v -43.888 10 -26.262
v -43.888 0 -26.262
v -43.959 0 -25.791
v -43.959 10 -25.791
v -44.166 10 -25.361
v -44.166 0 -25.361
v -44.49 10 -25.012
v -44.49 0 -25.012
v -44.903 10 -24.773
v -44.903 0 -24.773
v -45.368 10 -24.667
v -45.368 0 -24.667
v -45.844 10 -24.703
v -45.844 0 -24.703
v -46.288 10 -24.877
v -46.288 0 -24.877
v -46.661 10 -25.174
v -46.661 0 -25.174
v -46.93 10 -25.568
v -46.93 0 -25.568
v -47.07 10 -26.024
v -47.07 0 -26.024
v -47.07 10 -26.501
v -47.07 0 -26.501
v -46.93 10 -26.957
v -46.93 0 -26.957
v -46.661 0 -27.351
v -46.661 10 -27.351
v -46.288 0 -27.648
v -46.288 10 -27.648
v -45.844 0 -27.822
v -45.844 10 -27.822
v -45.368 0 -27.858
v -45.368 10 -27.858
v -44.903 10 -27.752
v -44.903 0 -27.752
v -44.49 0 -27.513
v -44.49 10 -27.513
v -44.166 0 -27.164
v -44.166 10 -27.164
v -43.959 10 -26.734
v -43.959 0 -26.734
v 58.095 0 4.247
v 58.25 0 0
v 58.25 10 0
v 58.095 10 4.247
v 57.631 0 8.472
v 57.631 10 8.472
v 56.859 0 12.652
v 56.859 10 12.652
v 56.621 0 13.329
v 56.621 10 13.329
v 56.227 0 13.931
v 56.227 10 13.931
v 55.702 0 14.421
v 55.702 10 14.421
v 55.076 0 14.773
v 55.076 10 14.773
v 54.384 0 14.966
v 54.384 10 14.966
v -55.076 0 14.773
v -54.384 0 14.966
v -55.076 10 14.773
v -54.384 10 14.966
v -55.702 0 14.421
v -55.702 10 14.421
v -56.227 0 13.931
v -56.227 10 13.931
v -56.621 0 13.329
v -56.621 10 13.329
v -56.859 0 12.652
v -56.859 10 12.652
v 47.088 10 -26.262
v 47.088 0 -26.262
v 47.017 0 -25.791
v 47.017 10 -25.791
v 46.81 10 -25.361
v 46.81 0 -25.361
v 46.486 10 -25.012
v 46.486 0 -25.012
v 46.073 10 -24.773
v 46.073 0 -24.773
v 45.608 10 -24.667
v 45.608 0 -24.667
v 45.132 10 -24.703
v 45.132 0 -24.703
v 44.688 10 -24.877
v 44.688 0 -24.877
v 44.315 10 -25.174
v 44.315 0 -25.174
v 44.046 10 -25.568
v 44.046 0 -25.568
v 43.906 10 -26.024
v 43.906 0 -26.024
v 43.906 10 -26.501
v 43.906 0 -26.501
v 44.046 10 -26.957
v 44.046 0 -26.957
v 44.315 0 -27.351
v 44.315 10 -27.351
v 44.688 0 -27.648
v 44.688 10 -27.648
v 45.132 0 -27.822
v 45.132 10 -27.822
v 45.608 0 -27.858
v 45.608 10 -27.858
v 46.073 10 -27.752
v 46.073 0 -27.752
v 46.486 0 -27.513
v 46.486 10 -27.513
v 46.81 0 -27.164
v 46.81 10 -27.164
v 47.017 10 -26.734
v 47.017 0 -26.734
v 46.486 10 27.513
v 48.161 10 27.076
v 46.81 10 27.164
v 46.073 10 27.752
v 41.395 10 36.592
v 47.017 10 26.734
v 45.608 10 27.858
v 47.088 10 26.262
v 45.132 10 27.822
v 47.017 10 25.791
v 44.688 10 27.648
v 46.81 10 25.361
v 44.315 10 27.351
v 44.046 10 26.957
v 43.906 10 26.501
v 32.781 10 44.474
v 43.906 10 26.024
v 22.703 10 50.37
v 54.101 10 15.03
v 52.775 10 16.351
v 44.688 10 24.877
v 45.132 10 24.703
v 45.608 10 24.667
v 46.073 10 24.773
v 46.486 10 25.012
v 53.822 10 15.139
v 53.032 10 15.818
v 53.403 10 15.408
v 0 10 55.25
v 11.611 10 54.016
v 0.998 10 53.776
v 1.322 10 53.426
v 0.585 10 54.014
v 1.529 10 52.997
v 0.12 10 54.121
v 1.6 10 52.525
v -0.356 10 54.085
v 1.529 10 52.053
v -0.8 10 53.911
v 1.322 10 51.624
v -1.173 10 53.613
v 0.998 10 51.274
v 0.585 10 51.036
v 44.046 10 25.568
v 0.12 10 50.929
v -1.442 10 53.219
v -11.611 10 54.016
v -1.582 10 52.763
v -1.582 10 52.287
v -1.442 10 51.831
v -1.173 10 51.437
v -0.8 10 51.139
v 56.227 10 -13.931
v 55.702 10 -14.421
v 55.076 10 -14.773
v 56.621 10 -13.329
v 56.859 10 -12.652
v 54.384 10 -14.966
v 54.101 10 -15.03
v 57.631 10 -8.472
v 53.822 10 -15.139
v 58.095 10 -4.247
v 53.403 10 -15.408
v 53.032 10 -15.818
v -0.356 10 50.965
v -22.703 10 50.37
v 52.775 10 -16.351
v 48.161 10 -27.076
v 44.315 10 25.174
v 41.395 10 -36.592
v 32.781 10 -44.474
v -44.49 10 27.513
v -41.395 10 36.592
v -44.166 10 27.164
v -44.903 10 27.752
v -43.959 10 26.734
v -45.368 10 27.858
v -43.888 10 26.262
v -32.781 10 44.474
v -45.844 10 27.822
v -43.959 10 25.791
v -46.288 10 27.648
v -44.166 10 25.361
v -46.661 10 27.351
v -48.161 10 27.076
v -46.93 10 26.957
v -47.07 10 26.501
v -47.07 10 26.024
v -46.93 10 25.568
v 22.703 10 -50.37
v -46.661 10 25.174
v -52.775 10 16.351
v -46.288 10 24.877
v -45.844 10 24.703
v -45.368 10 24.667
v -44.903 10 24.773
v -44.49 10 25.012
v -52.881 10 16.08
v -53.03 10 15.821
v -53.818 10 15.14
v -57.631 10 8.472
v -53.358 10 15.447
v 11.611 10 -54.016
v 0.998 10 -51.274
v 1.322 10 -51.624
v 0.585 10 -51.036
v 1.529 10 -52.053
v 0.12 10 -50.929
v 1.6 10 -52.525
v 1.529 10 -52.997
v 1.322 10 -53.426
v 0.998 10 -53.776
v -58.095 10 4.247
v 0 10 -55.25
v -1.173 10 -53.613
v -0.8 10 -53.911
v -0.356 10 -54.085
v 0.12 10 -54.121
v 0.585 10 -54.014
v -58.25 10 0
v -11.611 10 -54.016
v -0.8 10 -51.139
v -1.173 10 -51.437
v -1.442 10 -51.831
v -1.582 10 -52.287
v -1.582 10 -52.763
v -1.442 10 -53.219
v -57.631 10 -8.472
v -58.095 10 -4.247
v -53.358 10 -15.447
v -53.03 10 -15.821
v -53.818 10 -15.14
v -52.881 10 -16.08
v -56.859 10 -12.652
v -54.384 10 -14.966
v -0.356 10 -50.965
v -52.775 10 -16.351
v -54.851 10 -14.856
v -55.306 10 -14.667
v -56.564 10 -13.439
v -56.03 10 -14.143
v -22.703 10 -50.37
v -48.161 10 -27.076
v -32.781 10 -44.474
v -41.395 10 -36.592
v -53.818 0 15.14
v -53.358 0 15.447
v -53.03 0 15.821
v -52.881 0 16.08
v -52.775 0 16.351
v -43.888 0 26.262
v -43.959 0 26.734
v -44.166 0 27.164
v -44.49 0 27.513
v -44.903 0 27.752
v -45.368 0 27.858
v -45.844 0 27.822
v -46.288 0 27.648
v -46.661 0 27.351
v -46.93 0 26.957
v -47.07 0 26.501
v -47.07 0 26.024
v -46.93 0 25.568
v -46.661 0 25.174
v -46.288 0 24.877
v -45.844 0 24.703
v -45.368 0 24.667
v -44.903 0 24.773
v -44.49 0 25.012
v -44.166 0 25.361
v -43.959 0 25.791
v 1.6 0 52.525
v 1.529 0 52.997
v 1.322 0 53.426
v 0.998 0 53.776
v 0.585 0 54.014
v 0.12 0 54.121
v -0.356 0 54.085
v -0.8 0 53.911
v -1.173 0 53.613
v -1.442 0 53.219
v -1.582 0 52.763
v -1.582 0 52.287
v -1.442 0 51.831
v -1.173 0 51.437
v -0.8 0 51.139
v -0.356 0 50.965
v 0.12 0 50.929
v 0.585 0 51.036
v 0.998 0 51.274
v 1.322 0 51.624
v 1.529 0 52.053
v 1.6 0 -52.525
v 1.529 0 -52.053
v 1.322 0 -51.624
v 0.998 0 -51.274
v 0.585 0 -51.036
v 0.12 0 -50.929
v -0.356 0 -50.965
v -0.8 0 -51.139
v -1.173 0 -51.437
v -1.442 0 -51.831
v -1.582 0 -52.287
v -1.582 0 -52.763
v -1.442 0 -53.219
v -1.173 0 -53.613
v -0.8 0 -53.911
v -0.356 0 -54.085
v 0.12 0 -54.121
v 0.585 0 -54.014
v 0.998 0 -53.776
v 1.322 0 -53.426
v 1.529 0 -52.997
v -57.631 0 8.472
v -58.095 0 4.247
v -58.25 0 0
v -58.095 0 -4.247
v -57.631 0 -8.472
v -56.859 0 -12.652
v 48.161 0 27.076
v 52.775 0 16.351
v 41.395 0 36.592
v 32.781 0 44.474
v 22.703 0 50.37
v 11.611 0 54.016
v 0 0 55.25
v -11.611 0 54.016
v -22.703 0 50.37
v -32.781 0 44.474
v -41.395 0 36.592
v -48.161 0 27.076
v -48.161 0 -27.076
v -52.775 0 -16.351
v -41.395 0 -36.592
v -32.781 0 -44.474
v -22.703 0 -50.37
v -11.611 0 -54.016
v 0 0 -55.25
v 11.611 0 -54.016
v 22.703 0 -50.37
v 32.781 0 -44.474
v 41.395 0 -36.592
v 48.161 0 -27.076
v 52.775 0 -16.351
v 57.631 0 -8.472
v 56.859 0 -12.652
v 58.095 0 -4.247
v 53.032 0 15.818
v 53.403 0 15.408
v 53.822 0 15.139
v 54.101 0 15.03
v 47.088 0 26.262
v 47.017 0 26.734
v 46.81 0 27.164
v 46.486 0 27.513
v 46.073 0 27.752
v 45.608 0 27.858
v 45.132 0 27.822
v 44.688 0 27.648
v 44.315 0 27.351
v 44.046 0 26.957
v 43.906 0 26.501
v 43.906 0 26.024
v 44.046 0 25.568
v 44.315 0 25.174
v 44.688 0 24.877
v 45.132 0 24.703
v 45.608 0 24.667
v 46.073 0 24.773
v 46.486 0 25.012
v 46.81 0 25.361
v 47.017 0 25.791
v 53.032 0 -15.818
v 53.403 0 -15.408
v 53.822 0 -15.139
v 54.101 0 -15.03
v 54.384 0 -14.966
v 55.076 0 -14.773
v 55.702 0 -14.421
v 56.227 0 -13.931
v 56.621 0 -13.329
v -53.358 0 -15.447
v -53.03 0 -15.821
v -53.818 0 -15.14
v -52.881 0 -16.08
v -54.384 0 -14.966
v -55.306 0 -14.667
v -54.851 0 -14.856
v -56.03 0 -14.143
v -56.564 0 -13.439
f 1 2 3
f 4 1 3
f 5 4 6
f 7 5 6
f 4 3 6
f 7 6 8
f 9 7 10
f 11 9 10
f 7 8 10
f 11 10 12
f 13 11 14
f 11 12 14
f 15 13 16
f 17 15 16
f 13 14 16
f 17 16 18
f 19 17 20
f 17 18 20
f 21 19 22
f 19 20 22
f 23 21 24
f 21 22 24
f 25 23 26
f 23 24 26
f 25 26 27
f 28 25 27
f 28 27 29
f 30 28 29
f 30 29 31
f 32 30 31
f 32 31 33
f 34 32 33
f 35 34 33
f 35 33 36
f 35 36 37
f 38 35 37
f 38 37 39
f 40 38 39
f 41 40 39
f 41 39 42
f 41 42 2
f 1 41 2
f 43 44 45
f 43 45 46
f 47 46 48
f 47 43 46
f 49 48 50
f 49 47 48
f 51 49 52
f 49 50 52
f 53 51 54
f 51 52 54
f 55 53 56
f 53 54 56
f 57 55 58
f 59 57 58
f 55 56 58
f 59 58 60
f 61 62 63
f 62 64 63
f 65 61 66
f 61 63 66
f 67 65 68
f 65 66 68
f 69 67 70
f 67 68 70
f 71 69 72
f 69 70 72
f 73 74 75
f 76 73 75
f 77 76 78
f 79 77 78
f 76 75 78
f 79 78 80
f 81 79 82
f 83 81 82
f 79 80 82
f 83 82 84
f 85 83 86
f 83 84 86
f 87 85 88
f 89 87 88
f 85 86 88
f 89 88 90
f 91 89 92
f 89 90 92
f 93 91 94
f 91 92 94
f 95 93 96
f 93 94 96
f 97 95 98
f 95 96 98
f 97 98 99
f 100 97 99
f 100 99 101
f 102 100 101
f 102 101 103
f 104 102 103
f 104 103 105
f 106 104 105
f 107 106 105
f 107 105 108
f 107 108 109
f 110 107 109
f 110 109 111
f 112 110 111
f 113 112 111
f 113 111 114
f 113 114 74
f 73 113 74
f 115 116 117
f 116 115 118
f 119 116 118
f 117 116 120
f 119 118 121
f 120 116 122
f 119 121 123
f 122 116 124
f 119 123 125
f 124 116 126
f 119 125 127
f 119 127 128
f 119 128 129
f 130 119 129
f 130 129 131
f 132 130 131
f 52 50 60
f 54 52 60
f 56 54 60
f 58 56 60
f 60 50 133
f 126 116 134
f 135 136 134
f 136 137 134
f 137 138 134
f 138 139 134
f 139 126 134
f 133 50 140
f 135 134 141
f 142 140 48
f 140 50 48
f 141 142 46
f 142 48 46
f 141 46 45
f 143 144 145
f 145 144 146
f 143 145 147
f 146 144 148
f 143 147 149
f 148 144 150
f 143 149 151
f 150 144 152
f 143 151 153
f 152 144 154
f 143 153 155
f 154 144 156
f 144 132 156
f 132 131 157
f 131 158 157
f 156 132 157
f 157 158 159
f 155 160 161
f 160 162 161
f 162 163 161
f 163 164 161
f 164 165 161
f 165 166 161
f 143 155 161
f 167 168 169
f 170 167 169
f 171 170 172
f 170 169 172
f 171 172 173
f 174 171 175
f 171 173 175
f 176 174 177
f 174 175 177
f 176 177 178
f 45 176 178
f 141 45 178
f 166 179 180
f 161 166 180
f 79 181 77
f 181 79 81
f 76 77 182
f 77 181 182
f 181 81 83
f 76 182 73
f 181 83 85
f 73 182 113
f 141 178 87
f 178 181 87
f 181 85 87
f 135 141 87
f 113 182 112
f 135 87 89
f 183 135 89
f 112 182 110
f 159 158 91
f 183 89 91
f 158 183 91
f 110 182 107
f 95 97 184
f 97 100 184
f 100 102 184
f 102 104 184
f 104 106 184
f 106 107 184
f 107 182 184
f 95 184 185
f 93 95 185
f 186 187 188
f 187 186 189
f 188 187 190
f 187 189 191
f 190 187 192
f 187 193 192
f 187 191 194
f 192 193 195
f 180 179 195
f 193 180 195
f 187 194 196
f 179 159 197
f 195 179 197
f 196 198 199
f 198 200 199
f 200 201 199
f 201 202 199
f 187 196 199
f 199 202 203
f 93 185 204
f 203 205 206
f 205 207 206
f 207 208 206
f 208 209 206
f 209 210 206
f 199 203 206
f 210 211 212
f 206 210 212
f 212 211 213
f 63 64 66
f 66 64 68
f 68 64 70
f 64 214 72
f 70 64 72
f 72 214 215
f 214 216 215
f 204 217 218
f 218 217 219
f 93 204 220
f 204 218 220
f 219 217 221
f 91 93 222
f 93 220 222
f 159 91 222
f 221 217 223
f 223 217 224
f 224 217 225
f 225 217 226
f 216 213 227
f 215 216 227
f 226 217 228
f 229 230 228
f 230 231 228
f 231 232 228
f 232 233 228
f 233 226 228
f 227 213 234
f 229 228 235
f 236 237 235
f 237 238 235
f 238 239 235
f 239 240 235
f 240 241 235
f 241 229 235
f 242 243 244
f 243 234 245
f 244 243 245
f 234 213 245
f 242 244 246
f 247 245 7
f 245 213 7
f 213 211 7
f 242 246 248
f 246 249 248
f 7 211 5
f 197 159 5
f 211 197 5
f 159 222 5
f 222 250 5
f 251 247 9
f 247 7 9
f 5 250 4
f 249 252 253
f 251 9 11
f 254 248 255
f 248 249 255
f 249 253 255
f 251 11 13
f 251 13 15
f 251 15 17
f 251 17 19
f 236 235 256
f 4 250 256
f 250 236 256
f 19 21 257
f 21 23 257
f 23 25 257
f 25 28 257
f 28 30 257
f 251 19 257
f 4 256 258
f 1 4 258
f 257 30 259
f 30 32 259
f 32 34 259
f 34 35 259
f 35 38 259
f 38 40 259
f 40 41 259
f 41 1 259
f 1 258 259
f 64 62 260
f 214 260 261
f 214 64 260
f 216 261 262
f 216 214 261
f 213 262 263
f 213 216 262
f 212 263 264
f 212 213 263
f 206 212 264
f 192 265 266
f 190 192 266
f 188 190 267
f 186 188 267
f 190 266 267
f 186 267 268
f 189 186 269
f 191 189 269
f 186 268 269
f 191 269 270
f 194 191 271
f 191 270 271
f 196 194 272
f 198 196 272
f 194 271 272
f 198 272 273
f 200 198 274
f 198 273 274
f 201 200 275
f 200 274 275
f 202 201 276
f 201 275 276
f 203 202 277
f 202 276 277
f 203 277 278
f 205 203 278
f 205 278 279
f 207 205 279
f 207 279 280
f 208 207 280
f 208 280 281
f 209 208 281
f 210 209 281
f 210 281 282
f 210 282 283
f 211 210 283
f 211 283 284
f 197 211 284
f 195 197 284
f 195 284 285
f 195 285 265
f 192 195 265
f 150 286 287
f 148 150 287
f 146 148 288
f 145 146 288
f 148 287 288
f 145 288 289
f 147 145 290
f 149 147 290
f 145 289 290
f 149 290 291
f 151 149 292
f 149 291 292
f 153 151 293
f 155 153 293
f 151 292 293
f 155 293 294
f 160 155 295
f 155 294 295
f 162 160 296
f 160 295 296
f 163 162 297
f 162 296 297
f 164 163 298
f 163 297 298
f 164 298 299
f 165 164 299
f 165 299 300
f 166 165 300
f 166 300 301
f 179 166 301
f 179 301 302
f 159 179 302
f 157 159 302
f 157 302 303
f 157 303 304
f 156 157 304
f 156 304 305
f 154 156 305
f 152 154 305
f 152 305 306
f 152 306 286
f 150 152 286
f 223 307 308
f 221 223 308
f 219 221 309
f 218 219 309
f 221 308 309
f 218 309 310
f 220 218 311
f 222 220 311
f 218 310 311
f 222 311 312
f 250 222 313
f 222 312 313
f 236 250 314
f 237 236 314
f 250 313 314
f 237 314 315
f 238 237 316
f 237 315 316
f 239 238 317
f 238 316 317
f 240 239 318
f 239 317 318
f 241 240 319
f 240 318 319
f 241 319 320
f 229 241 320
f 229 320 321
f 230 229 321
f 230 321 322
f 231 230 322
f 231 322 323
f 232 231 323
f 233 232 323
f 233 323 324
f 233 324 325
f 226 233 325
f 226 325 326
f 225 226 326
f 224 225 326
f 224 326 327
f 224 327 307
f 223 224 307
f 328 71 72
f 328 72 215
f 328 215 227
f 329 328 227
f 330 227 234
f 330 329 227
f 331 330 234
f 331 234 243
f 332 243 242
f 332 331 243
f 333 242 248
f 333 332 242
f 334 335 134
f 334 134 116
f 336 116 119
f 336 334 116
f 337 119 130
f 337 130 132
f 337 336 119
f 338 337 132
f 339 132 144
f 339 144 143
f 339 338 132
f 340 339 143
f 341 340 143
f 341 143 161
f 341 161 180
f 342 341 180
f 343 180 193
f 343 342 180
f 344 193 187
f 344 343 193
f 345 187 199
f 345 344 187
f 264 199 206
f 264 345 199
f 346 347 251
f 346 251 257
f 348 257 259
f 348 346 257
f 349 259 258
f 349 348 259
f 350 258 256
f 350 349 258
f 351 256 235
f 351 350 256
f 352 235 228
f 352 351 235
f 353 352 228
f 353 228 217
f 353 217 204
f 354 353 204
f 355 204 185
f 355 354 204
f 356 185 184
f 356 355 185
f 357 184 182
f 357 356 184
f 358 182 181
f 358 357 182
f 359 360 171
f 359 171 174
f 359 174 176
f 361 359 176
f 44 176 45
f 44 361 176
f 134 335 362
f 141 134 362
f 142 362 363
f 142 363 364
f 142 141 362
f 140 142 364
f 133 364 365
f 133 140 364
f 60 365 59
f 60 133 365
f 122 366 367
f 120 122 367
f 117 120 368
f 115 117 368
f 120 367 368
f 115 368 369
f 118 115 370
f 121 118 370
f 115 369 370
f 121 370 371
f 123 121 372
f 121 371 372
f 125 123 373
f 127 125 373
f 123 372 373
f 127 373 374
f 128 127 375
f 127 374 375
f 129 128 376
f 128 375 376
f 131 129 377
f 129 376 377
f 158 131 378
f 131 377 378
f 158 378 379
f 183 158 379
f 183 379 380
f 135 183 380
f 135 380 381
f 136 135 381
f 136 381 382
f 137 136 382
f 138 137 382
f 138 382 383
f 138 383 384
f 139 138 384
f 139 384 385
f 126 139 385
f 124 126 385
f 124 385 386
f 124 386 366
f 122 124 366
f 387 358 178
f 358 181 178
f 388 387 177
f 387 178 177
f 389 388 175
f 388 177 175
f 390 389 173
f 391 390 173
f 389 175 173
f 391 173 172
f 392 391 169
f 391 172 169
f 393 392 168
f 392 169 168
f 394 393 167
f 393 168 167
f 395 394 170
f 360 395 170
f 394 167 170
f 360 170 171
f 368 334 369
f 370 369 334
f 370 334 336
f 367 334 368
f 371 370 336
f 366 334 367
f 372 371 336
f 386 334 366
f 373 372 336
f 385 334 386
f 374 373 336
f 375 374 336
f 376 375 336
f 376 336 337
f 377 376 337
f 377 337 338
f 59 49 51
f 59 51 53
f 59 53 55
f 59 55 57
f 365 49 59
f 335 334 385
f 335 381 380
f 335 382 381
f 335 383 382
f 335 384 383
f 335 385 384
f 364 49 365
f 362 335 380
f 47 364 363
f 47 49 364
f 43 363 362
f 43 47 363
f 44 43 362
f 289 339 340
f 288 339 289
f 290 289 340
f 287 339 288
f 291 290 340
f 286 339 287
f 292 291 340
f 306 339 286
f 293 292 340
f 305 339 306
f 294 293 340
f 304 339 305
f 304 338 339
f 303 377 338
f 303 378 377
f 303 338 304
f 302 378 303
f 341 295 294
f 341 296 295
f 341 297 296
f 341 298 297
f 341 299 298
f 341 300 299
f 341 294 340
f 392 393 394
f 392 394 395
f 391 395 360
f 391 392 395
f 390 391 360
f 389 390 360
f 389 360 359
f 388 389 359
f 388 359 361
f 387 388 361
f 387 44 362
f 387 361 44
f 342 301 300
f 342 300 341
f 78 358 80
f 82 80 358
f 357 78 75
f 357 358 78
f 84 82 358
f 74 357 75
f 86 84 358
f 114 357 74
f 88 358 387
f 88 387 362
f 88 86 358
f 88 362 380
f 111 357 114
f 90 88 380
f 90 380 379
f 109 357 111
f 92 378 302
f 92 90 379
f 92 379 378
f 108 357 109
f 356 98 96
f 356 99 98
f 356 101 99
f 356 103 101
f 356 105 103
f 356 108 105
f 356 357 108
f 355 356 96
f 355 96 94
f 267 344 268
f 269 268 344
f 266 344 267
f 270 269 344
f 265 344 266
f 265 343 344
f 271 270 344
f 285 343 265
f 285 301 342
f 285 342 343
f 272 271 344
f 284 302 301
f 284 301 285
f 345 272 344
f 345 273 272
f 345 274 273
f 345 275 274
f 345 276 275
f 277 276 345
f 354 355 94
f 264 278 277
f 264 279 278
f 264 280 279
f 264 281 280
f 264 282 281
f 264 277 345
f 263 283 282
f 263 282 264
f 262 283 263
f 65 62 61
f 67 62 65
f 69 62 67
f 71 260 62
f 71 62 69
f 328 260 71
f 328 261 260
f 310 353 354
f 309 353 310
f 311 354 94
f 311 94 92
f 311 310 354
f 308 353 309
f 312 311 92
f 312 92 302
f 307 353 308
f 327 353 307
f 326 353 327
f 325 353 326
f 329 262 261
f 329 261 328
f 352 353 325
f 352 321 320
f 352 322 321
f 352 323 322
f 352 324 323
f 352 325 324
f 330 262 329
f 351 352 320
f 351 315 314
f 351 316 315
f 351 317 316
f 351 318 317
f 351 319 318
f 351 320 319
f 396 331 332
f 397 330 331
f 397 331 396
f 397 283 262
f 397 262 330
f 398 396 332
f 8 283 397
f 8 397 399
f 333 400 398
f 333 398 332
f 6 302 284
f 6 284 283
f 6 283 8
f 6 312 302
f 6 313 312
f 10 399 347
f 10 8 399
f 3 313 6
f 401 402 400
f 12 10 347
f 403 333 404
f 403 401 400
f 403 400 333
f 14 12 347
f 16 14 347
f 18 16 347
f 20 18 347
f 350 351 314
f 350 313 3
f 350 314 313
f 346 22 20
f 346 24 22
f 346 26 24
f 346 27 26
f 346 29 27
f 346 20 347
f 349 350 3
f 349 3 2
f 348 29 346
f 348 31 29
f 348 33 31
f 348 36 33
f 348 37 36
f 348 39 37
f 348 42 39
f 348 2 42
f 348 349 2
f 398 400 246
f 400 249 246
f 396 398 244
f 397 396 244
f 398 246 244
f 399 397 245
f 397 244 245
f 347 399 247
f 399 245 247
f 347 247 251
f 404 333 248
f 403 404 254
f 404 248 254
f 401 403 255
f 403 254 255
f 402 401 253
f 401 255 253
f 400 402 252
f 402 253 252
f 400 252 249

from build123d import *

# Parameters (mm, degrees)
EXTRUDE_1_DEPTH     = 10
FILLET_2_R          = 3
FILLET_3_R          = 2
SKETCH_2_R          = 1.6
CUT_EXTRUDE_1_DEPTH = 11.0000001


with BuildPart() as part:
    # 草图1 → 凸台-拉伸1 (new body)
    with BuildSketch(Plane(origin=(0, 0, 0), x_dir=(1, 0, 0), z_dir=(0, 1, 0))):
        with BuildLine():
            Line((-53.174829572, -15), (-56.285544325, -15))
            ThreePointArc((-56.285544325, -15), (-57.756798115, -7.564044654), (-58.25, 0))
            ThreePointArc((-58.25, 0), (-57.756798115, 7.564044654), (-56.285544325, 15))
            add(Edge.make_bspline(
                [(-56.285544325, 15), (-53.174829572, 15)],
                knots=[0, 0, 1, 1], degree=1))
            ThreePointArc((-53.174829572, 15), (-33.345258284, 44.052880156), (0, 55.25))
            ThreePointArc((0, 55.25), (33.345258284, 44.052880156), (53.174829572, 15))
            Line((53.174829572, 15), (56.285544325, 15))
            ThreePointArc((56.285544325, 15), (57.756798115, 7.564044654), (58.25, 0))
            ThreePointArc((58.25, 0), (57.756798115, -7.564044654), (56.285544325, -15))
            Line((56.285544325, -15), (53.174829572, -15))
            ThreePointArc((53.174829572, -15), (33.345258284, -44.052880156), (0, -55.25))
            ThreePointArc((0, -55.25), (-33.345258284, -44.052880156), (-53.174829572, -15))
        make_face()
    extrude(amount=EXTRUDE_1_DEPTH)

    # 圆角2
    fillet_2_edges = [part.edges().sort_by_distance(p)[0] for p in [
        (-56.285544325, 5, -15),
        (56.285544325, 5, -15),
        (56.285544325, 5, 15),
        (-56.285544325, 5, 15),
    ]]
    fillet(fillet_2_edges, radius=FILLET_2_R)

    # 圆角3
    fillet_3_edges = [part.edges().sort_by_distance(p)[0] for p in [
        (-53.174829572, 5, -15),
        (53.174829572, 5, -15),
        (53.174829572, 5, 15),
        (-53.174829572, 5, 15),
    ]]
    fillet(fillet_3_edges, radius=FILLET_3_R)

    # 草图2 → 切除-拉伸1 (cut, through all)
    with BuildSketch(Plane.XZ):
        with Locations((0, 52.525)):
            Circle(SKETCH_2_R)
        with Locations((45.487984334, 26.2625)):
            Circle(SKETCH_2_R)
        with Locations((45.487984334, -26.2625)):
            Circle(SKETCH_2_R)
        with Locations((0, -52.525)):
            Circle(SKETCH_2_R)
        with Locations((-45.487984334, -26.2625)):
            Circle(SKETCH_2_R)
        with Locations((-45.487984334, 26.2625)):
            Circle(SKETCH_2_R)
    extrude(amount=-CUT_EXTRUDE_1_DEPTH, mode=Mode.SUBTRACT)


solid = part.part
